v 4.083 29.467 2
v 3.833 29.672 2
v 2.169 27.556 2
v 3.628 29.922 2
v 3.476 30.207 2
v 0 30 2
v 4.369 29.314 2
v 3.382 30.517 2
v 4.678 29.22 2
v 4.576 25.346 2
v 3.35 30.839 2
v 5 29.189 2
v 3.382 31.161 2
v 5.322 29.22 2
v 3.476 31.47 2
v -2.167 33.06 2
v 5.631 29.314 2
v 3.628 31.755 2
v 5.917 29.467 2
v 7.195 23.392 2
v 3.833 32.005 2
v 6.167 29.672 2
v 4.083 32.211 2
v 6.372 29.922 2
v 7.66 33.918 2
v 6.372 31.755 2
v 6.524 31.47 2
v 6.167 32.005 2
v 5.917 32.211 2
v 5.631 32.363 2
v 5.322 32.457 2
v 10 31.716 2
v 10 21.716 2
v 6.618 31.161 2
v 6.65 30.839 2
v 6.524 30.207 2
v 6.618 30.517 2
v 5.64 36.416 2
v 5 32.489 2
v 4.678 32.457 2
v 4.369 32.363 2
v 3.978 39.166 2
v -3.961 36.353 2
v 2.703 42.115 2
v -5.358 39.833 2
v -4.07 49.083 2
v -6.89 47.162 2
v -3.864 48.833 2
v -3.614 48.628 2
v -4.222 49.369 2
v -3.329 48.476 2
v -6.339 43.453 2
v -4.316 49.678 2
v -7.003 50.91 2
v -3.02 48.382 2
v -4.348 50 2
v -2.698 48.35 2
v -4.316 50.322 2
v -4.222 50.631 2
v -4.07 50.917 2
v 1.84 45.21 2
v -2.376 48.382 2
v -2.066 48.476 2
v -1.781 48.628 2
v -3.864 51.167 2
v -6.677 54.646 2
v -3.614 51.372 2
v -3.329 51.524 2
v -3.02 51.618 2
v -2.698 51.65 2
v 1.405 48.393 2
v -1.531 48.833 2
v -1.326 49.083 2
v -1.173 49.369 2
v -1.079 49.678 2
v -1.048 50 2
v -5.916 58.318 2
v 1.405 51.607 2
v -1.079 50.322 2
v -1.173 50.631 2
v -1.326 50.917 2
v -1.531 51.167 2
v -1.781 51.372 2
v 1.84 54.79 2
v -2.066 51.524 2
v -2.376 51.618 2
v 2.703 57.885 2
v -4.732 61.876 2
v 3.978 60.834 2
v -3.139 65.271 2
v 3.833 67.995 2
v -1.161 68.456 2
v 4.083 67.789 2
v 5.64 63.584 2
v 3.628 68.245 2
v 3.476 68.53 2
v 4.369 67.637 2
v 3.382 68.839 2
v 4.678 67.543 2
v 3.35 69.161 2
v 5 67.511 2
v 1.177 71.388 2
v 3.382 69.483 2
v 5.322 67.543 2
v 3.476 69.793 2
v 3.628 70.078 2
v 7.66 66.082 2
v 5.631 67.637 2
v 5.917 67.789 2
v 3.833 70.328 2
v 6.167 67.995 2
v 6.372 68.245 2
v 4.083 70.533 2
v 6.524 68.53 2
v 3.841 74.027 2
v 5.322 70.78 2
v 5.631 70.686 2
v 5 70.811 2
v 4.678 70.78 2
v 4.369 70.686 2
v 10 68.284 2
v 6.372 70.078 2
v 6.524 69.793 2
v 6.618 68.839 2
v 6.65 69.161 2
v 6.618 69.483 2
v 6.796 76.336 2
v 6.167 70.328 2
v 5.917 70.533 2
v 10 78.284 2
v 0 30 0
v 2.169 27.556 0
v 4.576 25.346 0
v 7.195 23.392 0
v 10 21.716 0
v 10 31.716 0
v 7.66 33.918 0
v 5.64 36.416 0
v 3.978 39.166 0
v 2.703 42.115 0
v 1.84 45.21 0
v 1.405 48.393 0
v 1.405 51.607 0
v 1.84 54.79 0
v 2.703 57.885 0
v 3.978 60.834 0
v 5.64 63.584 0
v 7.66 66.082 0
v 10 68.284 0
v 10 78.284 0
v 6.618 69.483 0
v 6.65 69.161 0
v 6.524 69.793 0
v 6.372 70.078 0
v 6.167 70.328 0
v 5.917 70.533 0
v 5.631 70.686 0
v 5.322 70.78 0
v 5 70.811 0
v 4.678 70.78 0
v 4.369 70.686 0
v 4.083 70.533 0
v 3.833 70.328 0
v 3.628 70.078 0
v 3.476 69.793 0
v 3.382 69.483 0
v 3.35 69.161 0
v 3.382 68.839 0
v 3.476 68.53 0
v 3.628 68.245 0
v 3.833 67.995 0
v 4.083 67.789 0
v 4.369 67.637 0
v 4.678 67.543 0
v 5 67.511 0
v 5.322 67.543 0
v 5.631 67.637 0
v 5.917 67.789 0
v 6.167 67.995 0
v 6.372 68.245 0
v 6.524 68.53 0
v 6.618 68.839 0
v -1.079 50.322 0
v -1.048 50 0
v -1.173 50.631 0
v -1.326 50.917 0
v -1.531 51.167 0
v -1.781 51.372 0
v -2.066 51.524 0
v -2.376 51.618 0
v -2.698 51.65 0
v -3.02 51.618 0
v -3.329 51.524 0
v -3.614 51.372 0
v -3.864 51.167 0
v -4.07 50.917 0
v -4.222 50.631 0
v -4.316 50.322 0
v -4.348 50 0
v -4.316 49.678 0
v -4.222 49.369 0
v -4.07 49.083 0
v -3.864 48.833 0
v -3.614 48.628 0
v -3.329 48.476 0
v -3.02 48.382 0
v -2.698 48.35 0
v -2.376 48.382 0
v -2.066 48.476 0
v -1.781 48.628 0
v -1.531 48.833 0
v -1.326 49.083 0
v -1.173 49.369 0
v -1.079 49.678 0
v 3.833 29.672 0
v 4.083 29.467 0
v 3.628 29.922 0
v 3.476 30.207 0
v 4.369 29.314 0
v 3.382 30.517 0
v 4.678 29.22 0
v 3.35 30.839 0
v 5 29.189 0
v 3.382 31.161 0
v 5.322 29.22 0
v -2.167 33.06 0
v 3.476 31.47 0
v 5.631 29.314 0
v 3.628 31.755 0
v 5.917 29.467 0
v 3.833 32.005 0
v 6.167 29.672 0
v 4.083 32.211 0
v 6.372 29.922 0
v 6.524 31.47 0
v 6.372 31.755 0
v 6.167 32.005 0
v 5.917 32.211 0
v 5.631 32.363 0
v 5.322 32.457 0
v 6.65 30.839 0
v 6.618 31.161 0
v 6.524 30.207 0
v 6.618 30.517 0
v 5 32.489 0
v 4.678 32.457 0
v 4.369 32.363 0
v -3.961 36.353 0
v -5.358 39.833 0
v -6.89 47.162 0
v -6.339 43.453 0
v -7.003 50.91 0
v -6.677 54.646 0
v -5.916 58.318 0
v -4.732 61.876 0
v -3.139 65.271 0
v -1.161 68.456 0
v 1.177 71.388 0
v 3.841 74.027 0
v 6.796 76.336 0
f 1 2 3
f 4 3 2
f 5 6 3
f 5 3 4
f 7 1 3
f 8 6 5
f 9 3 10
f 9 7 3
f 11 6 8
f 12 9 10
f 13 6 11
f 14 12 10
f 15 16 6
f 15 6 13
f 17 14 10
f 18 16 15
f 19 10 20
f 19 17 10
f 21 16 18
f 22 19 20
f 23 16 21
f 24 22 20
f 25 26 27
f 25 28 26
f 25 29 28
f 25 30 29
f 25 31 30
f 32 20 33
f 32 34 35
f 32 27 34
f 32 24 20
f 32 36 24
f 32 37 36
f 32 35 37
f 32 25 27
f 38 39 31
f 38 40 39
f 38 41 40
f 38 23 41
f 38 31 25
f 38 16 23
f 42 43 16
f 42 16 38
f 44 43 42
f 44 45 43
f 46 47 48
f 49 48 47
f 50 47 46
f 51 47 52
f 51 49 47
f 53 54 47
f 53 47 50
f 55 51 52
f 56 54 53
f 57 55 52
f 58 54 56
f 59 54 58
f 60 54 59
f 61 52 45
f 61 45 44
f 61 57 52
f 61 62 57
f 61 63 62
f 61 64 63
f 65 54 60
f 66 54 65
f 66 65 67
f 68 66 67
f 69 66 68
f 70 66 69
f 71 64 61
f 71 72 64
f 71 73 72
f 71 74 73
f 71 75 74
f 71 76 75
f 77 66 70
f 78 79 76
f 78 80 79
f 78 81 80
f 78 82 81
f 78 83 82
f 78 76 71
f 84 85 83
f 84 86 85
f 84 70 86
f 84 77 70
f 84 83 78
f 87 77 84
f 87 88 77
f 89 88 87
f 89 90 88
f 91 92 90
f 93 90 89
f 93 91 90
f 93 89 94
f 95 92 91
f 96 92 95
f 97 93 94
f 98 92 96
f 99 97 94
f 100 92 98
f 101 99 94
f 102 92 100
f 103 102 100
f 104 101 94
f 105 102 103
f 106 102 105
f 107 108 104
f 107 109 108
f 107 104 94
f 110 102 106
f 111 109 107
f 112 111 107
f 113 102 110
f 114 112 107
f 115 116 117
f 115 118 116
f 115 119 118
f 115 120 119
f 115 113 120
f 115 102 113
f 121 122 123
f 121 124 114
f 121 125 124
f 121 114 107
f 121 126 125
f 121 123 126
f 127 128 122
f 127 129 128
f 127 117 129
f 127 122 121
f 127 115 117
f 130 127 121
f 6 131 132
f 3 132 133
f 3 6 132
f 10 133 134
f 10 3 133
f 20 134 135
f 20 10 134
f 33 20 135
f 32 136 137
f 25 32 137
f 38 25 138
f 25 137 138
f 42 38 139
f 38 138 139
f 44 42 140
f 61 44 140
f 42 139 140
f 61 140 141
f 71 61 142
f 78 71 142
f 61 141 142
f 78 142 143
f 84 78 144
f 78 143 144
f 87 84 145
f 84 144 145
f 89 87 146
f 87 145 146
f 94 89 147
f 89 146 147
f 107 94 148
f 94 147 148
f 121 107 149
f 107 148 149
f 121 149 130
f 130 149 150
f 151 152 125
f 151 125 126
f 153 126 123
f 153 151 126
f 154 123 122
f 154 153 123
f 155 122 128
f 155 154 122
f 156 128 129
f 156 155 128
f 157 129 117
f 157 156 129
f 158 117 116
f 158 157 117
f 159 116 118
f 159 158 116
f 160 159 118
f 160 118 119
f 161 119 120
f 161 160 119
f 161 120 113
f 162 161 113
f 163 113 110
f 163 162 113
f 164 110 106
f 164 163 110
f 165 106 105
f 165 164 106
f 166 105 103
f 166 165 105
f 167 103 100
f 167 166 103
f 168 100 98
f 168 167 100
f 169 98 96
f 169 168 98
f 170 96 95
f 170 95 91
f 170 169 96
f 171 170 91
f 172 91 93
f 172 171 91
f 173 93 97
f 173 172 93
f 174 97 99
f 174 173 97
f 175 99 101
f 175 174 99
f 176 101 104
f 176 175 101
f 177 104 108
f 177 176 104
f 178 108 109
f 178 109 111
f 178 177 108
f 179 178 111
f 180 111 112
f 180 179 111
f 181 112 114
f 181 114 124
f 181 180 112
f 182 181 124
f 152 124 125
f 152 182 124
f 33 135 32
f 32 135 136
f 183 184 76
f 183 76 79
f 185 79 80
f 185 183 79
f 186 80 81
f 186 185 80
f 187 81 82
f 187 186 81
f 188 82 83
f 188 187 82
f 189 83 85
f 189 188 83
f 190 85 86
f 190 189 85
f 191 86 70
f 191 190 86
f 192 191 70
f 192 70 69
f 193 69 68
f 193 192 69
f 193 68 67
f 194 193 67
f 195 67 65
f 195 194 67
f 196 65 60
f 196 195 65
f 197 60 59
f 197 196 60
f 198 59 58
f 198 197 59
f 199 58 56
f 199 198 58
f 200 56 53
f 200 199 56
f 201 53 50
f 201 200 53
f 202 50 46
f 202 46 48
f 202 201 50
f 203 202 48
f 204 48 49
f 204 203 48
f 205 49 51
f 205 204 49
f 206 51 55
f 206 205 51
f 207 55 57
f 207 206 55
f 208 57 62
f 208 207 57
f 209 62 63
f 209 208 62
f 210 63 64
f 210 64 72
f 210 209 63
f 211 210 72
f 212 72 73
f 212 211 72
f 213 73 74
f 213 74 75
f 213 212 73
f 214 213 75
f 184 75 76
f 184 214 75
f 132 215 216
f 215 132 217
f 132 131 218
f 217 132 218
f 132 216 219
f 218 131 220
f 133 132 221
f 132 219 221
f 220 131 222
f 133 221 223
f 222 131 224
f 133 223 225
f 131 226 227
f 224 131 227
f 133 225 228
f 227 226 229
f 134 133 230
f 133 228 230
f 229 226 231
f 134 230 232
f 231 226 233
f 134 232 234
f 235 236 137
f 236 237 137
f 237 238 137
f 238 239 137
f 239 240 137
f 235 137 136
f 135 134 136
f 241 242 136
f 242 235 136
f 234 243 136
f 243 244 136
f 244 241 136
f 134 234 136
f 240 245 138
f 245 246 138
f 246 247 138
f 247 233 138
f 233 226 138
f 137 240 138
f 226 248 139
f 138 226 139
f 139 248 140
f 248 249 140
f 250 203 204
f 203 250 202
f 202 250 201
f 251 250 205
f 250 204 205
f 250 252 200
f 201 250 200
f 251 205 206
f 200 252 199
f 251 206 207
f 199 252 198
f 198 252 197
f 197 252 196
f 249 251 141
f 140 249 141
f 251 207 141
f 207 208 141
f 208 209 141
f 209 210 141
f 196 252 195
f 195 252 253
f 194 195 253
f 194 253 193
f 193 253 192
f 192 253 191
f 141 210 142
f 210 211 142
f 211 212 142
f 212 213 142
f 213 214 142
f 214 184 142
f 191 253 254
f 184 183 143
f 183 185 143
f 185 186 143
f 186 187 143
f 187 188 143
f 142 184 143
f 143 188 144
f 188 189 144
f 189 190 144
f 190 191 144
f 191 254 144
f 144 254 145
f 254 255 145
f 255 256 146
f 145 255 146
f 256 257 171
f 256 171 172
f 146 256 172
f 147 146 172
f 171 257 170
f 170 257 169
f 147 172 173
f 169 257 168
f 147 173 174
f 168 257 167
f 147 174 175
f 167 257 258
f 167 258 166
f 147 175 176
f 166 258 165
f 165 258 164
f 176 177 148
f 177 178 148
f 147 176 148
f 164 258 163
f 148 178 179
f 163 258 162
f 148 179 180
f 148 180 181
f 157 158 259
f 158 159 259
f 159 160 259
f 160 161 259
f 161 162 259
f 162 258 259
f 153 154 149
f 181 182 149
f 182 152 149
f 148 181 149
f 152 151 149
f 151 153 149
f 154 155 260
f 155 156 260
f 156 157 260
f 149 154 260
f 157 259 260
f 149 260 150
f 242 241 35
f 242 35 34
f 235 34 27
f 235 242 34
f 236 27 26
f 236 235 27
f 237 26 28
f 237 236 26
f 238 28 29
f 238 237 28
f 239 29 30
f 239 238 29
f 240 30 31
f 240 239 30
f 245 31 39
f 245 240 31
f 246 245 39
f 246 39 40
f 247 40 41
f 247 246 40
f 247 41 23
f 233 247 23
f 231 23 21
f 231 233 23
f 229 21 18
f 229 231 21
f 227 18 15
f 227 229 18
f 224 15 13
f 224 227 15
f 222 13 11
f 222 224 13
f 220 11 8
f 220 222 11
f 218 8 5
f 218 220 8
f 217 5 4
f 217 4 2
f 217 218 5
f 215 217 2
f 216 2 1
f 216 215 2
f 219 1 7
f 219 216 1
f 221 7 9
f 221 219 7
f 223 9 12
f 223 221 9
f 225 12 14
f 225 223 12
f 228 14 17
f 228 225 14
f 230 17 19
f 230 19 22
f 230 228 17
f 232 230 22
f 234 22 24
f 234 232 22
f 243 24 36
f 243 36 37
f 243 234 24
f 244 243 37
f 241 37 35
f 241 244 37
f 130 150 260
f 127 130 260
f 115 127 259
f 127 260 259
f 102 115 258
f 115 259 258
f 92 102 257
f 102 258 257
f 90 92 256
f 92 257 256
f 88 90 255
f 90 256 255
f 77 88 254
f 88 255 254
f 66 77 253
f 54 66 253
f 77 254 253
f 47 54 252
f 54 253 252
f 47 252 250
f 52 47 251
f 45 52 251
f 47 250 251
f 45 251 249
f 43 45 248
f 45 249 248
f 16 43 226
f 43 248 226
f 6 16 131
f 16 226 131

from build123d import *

# Parameters (mm, degrees)
SKETCH_1_R          = 1.65
EXTRUDE_1_DEPTH     = 2
SKETCH_2_OUTSIDE_W  = 35.044
SKETCH_2_OUTSIDE_H  = 96.312
SKETCH_2_OUTSIDE_R  = 32.015621187
CUT_EXTRUDE_1_DEPTH = 10


with BuildPart() as part:
    # 草图1 → 凸台-拉伸1 (new body)
    with BuildSketch(Plane.XY):
        with BuildLine():
            Line((10, 68.284271247), (10, 78.284271247))
            ThreePointArc((10, 78.284271247), (-6.350322366, 56.492864354), (0, 30))
            Line((0, 30), (0, 0))
            Line((0, 0), (10, 0))
            Line((10, 0), (10, 31.715728753))
            ThreePointArc((10, 31.715728753), (1.350167547, 50), (10, 68.284271247))
        make_face()
        with Locations((5, 5)):
            Circle(SKETCH_1_R, mode=Mode.SUBTRACT)
        with Locations((5, 17)):
            Circle(SKETCH_1_R, mode=Mode.SUBTRACT)
        with Locations((-2.697604364, 50)):
            Circle(SKETCH_1_R, mode=Mode.SUBTRACT)
        with Locations((5, 69.161348792)):
            Circle(SKETCH_1_R, mode=Mode.SUBTRACT)
        with Locations((5, 30.838651208)):
            Circle(SKETCH_1_R, mode=Mode.SUBTRACT)
    extrude(amount=EXTRUDE_1_DEPTH)

    # 草图2 outside → 切除-拉伸1 (cut)
    with BuildSketch(Plane.XY.offset(2)):
        with Locations((1.492, 39.142)):
            Rectangle(SKETCH_2_OUTSIDE_W, SKETCH_2_OUTSIDE_H)
        with Locations((25, 50)):
            Circle(SKETCH_2_OUTSIDE_R, mode=Mode.SUBTRACT)
    extrude(amount=-CUT_EXTRUDE_1_DEPTH, mode=Mode.SUBTRACT)


solid = part.part
